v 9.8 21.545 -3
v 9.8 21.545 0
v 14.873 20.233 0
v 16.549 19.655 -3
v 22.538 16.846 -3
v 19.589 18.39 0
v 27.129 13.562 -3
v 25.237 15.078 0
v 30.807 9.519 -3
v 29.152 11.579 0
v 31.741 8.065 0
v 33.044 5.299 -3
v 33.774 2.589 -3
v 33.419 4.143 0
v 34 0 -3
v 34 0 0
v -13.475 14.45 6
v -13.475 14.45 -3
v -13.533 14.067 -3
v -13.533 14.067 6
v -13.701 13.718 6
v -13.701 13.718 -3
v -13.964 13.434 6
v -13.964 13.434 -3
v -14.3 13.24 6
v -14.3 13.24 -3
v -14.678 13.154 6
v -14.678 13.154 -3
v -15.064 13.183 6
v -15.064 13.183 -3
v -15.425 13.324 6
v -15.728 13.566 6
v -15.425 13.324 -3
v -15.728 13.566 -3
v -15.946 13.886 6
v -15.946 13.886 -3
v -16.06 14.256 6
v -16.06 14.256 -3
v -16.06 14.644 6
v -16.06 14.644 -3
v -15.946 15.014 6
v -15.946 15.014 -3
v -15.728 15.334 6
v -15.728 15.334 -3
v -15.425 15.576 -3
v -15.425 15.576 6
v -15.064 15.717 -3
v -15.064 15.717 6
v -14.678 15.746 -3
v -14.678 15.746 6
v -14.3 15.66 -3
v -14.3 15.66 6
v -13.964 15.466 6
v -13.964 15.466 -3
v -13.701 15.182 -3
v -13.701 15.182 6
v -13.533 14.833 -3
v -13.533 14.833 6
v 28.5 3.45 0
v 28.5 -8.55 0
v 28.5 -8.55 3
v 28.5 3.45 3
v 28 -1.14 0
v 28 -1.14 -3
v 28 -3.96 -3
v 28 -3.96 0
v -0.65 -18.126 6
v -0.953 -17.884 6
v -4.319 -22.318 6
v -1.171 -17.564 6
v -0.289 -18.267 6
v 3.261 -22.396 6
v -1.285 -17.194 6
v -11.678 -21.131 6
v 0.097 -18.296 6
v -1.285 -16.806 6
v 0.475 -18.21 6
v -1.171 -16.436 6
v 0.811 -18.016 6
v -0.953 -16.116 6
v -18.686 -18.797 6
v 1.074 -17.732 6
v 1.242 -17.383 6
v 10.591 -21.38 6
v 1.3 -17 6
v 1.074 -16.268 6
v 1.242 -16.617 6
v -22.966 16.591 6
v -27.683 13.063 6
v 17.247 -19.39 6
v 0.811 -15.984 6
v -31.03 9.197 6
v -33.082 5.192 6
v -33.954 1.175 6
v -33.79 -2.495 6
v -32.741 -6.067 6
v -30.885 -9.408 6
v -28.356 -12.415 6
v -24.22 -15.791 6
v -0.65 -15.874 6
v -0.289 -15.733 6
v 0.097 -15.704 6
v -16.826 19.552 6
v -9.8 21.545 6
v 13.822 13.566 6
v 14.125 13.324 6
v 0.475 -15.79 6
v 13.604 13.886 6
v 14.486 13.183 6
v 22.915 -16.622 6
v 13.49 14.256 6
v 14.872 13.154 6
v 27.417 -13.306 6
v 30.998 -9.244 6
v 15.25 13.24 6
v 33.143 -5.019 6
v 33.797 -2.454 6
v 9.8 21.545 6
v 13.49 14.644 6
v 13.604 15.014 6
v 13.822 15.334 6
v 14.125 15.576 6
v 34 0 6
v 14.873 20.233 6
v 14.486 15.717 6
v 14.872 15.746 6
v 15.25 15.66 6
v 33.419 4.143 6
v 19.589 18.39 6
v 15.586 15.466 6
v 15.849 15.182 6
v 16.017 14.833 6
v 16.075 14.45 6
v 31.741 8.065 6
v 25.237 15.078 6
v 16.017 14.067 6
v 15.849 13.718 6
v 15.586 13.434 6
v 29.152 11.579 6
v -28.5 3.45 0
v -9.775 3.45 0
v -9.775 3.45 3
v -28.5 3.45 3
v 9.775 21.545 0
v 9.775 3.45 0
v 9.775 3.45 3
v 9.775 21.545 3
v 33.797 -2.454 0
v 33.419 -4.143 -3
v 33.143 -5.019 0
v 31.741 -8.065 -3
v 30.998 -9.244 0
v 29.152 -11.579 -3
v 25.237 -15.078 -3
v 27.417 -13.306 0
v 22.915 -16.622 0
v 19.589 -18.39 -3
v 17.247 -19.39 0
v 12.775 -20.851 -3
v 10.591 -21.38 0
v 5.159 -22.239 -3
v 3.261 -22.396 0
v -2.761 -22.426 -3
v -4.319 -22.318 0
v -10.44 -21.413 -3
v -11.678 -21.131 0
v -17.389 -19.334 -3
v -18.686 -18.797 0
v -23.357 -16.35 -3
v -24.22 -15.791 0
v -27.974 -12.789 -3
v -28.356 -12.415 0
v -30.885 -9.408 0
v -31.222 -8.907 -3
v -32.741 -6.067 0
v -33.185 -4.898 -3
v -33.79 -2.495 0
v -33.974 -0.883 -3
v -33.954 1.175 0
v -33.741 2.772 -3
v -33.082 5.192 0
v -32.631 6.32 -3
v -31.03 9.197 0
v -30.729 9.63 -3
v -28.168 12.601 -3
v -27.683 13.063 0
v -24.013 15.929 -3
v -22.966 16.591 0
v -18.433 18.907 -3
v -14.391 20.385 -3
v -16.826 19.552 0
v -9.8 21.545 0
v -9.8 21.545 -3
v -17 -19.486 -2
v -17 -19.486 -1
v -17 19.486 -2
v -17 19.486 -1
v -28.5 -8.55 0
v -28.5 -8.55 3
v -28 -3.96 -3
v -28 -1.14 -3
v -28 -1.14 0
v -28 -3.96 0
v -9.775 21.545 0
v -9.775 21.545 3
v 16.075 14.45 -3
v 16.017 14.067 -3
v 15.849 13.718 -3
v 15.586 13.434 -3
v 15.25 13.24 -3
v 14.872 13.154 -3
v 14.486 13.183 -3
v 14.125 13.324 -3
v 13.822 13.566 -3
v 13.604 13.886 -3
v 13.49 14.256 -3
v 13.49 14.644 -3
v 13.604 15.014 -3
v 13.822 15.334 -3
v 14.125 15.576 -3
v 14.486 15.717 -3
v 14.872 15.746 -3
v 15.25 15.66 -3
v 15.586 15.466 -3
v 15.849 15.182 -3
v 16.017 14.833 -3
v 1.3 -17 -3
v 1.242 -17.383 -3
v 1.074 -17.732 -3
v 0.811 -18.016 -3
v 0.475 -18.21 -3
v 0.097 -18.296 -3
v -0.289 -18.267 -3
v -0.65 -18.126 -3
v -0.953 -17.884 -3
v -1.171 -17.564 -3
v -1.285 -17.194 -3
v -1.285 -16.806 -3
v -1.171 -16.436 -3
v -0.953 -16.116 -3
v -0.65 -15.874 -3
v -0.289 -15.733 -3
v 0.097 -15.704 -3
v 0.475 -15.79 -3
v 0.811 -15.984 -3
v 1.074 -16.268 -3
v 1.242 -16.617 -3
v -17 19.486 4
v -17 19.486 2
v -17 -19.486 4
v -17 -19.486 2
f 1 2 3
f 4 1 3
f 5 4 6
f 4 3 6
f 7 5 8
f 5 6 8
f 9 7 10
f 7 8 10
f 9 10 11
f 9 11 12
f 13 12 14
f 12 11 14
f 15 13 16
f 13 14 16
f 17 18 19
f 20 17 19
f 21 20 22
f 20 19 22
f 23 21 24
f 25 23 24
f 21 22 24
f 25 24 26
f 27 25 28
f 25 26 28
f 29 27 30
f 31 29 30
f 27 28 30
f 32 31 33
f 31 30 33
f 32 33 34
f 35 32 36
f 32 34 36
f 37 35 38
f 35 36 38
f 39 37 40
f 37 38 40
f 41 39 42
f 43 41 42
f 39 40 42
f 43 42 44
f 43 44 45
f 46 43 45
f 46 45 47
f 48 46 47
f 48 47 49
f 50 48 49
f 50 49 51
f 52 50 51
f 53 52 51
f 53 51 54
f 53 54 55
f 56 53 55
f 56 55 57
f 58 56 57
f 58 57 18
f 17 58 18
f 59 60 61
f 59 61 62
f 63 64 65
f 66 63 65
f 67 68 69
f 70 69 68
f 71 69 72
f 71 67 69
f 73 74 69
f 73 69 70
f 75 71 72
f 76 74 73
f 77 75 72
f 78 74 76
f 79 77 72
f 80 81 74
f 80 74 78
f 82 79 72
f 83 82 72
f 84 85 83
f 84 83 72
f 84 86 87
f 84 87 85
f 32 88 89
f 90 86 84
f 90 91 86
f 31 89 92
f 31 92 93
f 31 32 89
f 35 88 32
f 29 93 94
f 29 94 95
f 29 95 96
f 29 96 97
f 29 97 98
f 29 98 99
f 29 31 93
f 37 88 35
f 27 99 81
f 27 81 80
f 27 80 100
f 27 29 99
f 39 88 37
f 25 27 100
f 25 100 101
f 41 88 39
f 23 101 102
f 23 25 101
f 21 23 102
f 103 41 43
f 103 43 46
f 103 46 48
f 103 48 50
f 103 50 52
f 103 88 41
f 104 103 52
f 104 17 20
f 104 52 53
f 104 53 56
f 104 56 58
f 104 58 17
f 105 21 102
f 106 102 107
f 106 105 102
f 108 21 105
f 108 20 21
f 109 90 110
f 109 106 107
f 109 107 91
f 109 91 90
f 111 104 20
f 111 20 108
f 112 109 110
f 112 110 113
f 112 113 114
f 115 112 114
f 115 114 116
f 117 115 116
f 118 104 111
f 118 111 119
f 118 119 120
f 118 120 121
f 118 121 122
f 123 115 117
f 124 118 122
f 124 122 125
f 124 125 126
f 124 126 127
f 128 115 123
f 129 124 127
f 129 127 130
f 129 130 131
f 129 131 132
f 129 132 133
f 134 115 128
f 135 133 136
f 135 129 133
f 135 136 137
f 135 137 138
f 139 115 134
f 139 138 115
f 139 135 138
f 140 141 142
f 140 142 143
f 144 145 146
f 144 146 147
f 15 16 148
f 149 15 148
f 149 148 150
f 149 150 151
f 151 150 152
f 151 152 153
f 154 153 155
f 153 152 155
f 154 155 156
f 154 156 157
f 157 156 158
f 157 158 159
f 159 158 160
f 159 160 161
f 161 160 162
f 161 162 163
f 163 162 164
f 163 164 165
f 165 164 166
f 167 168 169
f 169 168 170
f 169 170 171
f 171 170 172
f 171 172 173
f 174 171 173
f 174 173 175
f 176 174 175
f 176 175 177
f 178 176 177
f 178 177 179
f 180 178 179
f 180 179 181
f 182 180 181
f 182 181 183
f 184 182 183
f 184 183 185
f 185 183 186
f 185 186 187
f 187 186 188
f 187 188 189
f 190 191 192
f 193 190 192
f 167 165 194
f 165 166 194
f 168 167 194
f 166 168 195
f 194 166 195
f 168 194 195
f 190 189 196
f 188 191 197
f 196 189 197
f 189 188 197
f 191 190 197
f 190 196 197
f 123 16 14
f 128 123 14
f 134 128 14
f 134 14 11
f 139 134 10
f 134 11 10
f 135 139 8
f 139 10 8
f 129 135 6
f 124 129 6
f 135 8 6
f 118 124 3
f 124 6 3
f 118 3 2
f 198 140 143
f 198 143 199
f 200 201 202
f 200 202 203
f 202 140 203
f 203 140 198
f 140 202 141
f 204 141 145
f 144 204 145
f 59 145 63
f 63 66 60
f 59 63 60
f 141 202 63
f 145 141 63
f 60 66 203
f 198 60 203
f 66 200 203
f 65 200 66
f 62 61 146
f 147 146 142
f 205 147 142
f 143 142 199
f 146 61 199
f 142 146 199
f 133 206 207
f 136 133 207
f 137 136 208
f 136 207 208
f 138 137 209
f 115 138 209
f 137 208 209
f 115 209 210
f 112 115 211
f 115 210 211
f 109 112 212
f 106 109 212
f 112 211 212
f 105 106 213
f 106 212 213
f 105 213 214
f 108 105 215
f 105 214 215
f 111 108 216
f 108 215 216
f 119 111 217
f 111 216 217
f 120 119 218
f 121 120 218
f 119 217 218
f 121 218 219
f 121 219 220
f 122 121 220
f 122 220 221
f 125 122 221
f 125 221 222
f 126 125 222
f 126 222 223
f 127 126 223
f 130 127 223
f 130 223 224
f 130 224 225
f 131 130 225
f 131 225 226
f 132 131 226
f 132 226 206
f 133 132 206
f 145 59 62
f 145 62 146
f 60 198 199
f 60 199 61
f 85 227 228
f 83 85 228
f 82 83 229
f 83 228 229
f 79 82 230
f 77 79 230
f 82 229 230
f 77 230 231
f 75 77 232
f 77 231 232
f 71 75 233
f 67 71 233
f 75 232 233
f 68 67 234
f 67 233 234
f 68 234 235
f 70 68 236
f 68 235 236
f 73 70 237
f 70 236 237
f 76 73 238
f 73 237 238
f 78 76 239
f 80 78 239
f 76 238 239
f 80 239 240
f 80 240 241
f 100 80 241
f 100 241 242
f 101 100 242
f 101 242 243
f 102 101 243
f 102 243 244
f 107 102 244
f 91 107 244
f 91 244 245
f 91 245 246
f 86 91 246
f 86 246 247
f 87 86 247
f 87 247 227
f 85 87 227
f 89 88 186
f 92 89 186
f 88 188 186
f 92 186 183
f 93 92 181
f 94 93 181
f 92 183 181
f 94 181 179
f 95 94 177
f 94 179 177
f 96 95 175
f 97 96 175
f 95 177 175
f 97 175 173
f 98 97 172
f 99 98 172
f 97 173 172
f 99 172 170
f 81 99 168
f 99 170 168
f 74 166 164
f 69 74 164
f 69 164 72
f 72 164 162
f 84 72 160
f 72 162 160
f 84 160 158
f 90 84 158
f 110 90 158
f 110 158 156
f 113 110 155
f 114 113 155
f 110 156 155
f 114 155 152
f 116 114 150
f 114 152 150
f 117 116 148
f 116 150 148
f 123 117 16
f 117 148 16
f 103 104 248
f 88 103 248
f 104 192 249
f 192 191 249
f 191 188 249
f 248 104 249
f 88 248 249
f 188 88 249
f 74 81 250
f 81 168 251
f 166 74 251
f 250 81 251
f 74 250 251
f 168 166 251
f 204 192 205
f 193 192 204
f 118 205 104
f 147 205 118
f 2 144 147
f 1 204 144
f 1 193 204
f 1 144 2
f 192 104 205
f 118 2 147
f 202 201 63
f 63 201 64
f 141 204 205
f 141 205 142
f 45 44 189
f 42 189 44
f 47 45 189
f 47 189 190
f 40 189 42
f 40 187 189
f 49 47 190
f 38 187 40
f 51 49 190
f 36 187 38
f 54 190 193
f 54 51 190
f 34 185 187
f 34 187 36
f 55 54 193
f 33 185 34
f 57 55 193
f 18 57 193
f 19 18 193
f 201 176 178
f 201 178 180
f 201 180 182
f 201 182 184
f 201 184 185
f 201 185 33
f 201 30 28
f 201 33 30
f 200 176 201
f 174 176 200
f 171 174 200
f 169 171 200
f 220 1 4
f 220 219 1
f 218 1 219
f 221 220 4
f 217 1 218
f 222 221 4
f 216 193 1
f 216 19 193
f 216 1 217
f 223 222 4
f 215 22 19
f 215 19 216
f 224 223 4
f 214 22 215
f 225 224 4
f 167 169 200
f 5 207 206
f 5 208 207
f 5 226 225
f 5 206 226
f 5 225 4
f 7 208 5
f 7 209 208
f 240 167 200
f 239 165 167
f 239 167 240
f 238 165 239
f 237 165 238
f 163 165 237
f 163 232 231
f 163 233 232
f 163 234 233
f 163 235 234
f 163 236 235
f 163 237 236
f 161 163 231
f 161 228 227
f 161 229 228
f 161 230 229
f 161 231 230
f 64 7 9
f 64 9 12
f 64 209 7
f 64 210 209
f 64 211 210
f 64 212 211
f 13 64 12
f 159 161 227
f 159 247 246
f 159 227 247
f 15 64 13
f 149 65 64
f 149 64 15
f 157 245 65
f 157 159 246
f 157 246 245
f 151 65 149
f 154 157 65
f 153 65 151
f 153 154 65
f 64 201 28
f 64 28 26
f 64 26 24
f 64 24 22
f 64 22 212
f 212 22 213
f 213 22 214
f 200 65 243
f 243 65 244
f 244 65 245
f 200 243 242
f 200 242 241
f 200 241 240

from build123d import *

# Parameters (mm, degrees)
PAD_DEPTH       = 6
POCKET_DEPTH    = 3
PAD001_DEPTH    = 3
SKETCH003_W     = 56
SKETCH003_H     = 2.82
POCKET001_DEPTH = 3
SKETCH004_W     = 19.6
SKETCH004_H     = 1
POCKET002_DEPTH = 9.001
SKETCH005_R     = 1.3
POCKET003_DEPTH = 9.001


with BuildPart() as part:
    # Sketch → Pad (new body)
    with BuildSketch(Plane.XY):
        with BuildLine():
            add(Edge.make_bspline(
                [(34, 0), (34, 38.971143), (-17, 19.485572), (-68, 0), (-17, -19.485572), (34, -38.971143), (34, 0)],
                knots=[0, 0, 0, 2.094395, 2.094395, 4.18879, 4.18879, 6.283185, 6.283185, 6.283185], degree=2, weights=[1, 0.5, 1, 0.5, 1, 0.5, 1]))
        make_face()
    extrude(amount=PAD_DEPTH)

    # Sketch001 (on Face2 of Pad) → Pocket (cut)
    with BuildSketch(Plane(origin=(0, 0, 0), x_dir=(1, 0, 0), z_dir=(0, 0, -1))):
        Polygon((9.775, -3.450064), (9.775, -21.550064), (-9.775, -21.550064), (-9.775, -3.450064), (-28.5, -3.450064), (-28.5, 8.549936), (28.5, 8.549936), (28.5, -3.450064), align=None)
    extrude(amount=-POCKET_DEPTH, mode=Mode.SUBTRACT)

    # Sketch002 (on Face2 of Pocket) → Pad001 (join)
    with BuildSketch(Plane(origin=(0, 0, 0), x_dir=(1, 0, 0), z_dir=(0, 0, -1))):
        with BuildLine():
            add(Edge.make_bspline(
                [(34, 0), (34, 38.971143), (-17, 19.485572), (-68, 0), (-17, -19.485572), (34, -38.971143), (34, 0)],
                knots=[0, 0, 0, 2.094395, 2.094395, 4.18879, 4.18879, 6.283185, 6.283185, 6.283185], degree=2, weights=[1, 0.5, 1, 0.5, 1, 0.5, 1]))
        make_face()
    extrude(amount=PAD001_DEPTH)

    # Sketch003 (on Face4 of Pad001) → Pocket001 (cut)
    with BuildSketch(Plane(origin=(0, 0, -3), x_dir=(1, 0, 0), z_dir=(0, 0, -1))):
        with Locations((0, 2.549936)):
            Rectangle(SKETCH003_W, SKETCH003_H)
    extrude(amount=-POCKET001_DEPTH, mode=Mode.SUBTRACT)

    # Sketch004 (on Face4 of Pocket001) → Pocket002 (cut, through all)
    with BuildSketch(Plane(origin=(0, 0, -3), x_dir=(1, 0, 0), z_dir=(0, 0, -1))):
        with Locations((0, -22.045091)):
            Rectangle(SKETCH004_W, SKETCH004_H)
    extrude(amount=-POCKET002_DEPTH, mode=Mode.SUBTRACT)

    # Sketch005 (on Face7 of Pocket002) → Pocket003 (cut, through all)
    with BuildSketch(Plane(origin=(0, 0, -3), x_dir=(1, 0, 0), z_dir=(0, 0, -1))):
        with Locations((-14.775, -14.450064)):
            Circle(SKETCH005_R)
        with Locations((0, 17)):
            Circle(SKETCH005_R)
        with Locations((14.775, -14.450064)):
            Circle(SKETCH005_R)
    extrude(amount=-POCKET003_DEPTH, mode=Mode.SUBTRACT)


solid = part.part
